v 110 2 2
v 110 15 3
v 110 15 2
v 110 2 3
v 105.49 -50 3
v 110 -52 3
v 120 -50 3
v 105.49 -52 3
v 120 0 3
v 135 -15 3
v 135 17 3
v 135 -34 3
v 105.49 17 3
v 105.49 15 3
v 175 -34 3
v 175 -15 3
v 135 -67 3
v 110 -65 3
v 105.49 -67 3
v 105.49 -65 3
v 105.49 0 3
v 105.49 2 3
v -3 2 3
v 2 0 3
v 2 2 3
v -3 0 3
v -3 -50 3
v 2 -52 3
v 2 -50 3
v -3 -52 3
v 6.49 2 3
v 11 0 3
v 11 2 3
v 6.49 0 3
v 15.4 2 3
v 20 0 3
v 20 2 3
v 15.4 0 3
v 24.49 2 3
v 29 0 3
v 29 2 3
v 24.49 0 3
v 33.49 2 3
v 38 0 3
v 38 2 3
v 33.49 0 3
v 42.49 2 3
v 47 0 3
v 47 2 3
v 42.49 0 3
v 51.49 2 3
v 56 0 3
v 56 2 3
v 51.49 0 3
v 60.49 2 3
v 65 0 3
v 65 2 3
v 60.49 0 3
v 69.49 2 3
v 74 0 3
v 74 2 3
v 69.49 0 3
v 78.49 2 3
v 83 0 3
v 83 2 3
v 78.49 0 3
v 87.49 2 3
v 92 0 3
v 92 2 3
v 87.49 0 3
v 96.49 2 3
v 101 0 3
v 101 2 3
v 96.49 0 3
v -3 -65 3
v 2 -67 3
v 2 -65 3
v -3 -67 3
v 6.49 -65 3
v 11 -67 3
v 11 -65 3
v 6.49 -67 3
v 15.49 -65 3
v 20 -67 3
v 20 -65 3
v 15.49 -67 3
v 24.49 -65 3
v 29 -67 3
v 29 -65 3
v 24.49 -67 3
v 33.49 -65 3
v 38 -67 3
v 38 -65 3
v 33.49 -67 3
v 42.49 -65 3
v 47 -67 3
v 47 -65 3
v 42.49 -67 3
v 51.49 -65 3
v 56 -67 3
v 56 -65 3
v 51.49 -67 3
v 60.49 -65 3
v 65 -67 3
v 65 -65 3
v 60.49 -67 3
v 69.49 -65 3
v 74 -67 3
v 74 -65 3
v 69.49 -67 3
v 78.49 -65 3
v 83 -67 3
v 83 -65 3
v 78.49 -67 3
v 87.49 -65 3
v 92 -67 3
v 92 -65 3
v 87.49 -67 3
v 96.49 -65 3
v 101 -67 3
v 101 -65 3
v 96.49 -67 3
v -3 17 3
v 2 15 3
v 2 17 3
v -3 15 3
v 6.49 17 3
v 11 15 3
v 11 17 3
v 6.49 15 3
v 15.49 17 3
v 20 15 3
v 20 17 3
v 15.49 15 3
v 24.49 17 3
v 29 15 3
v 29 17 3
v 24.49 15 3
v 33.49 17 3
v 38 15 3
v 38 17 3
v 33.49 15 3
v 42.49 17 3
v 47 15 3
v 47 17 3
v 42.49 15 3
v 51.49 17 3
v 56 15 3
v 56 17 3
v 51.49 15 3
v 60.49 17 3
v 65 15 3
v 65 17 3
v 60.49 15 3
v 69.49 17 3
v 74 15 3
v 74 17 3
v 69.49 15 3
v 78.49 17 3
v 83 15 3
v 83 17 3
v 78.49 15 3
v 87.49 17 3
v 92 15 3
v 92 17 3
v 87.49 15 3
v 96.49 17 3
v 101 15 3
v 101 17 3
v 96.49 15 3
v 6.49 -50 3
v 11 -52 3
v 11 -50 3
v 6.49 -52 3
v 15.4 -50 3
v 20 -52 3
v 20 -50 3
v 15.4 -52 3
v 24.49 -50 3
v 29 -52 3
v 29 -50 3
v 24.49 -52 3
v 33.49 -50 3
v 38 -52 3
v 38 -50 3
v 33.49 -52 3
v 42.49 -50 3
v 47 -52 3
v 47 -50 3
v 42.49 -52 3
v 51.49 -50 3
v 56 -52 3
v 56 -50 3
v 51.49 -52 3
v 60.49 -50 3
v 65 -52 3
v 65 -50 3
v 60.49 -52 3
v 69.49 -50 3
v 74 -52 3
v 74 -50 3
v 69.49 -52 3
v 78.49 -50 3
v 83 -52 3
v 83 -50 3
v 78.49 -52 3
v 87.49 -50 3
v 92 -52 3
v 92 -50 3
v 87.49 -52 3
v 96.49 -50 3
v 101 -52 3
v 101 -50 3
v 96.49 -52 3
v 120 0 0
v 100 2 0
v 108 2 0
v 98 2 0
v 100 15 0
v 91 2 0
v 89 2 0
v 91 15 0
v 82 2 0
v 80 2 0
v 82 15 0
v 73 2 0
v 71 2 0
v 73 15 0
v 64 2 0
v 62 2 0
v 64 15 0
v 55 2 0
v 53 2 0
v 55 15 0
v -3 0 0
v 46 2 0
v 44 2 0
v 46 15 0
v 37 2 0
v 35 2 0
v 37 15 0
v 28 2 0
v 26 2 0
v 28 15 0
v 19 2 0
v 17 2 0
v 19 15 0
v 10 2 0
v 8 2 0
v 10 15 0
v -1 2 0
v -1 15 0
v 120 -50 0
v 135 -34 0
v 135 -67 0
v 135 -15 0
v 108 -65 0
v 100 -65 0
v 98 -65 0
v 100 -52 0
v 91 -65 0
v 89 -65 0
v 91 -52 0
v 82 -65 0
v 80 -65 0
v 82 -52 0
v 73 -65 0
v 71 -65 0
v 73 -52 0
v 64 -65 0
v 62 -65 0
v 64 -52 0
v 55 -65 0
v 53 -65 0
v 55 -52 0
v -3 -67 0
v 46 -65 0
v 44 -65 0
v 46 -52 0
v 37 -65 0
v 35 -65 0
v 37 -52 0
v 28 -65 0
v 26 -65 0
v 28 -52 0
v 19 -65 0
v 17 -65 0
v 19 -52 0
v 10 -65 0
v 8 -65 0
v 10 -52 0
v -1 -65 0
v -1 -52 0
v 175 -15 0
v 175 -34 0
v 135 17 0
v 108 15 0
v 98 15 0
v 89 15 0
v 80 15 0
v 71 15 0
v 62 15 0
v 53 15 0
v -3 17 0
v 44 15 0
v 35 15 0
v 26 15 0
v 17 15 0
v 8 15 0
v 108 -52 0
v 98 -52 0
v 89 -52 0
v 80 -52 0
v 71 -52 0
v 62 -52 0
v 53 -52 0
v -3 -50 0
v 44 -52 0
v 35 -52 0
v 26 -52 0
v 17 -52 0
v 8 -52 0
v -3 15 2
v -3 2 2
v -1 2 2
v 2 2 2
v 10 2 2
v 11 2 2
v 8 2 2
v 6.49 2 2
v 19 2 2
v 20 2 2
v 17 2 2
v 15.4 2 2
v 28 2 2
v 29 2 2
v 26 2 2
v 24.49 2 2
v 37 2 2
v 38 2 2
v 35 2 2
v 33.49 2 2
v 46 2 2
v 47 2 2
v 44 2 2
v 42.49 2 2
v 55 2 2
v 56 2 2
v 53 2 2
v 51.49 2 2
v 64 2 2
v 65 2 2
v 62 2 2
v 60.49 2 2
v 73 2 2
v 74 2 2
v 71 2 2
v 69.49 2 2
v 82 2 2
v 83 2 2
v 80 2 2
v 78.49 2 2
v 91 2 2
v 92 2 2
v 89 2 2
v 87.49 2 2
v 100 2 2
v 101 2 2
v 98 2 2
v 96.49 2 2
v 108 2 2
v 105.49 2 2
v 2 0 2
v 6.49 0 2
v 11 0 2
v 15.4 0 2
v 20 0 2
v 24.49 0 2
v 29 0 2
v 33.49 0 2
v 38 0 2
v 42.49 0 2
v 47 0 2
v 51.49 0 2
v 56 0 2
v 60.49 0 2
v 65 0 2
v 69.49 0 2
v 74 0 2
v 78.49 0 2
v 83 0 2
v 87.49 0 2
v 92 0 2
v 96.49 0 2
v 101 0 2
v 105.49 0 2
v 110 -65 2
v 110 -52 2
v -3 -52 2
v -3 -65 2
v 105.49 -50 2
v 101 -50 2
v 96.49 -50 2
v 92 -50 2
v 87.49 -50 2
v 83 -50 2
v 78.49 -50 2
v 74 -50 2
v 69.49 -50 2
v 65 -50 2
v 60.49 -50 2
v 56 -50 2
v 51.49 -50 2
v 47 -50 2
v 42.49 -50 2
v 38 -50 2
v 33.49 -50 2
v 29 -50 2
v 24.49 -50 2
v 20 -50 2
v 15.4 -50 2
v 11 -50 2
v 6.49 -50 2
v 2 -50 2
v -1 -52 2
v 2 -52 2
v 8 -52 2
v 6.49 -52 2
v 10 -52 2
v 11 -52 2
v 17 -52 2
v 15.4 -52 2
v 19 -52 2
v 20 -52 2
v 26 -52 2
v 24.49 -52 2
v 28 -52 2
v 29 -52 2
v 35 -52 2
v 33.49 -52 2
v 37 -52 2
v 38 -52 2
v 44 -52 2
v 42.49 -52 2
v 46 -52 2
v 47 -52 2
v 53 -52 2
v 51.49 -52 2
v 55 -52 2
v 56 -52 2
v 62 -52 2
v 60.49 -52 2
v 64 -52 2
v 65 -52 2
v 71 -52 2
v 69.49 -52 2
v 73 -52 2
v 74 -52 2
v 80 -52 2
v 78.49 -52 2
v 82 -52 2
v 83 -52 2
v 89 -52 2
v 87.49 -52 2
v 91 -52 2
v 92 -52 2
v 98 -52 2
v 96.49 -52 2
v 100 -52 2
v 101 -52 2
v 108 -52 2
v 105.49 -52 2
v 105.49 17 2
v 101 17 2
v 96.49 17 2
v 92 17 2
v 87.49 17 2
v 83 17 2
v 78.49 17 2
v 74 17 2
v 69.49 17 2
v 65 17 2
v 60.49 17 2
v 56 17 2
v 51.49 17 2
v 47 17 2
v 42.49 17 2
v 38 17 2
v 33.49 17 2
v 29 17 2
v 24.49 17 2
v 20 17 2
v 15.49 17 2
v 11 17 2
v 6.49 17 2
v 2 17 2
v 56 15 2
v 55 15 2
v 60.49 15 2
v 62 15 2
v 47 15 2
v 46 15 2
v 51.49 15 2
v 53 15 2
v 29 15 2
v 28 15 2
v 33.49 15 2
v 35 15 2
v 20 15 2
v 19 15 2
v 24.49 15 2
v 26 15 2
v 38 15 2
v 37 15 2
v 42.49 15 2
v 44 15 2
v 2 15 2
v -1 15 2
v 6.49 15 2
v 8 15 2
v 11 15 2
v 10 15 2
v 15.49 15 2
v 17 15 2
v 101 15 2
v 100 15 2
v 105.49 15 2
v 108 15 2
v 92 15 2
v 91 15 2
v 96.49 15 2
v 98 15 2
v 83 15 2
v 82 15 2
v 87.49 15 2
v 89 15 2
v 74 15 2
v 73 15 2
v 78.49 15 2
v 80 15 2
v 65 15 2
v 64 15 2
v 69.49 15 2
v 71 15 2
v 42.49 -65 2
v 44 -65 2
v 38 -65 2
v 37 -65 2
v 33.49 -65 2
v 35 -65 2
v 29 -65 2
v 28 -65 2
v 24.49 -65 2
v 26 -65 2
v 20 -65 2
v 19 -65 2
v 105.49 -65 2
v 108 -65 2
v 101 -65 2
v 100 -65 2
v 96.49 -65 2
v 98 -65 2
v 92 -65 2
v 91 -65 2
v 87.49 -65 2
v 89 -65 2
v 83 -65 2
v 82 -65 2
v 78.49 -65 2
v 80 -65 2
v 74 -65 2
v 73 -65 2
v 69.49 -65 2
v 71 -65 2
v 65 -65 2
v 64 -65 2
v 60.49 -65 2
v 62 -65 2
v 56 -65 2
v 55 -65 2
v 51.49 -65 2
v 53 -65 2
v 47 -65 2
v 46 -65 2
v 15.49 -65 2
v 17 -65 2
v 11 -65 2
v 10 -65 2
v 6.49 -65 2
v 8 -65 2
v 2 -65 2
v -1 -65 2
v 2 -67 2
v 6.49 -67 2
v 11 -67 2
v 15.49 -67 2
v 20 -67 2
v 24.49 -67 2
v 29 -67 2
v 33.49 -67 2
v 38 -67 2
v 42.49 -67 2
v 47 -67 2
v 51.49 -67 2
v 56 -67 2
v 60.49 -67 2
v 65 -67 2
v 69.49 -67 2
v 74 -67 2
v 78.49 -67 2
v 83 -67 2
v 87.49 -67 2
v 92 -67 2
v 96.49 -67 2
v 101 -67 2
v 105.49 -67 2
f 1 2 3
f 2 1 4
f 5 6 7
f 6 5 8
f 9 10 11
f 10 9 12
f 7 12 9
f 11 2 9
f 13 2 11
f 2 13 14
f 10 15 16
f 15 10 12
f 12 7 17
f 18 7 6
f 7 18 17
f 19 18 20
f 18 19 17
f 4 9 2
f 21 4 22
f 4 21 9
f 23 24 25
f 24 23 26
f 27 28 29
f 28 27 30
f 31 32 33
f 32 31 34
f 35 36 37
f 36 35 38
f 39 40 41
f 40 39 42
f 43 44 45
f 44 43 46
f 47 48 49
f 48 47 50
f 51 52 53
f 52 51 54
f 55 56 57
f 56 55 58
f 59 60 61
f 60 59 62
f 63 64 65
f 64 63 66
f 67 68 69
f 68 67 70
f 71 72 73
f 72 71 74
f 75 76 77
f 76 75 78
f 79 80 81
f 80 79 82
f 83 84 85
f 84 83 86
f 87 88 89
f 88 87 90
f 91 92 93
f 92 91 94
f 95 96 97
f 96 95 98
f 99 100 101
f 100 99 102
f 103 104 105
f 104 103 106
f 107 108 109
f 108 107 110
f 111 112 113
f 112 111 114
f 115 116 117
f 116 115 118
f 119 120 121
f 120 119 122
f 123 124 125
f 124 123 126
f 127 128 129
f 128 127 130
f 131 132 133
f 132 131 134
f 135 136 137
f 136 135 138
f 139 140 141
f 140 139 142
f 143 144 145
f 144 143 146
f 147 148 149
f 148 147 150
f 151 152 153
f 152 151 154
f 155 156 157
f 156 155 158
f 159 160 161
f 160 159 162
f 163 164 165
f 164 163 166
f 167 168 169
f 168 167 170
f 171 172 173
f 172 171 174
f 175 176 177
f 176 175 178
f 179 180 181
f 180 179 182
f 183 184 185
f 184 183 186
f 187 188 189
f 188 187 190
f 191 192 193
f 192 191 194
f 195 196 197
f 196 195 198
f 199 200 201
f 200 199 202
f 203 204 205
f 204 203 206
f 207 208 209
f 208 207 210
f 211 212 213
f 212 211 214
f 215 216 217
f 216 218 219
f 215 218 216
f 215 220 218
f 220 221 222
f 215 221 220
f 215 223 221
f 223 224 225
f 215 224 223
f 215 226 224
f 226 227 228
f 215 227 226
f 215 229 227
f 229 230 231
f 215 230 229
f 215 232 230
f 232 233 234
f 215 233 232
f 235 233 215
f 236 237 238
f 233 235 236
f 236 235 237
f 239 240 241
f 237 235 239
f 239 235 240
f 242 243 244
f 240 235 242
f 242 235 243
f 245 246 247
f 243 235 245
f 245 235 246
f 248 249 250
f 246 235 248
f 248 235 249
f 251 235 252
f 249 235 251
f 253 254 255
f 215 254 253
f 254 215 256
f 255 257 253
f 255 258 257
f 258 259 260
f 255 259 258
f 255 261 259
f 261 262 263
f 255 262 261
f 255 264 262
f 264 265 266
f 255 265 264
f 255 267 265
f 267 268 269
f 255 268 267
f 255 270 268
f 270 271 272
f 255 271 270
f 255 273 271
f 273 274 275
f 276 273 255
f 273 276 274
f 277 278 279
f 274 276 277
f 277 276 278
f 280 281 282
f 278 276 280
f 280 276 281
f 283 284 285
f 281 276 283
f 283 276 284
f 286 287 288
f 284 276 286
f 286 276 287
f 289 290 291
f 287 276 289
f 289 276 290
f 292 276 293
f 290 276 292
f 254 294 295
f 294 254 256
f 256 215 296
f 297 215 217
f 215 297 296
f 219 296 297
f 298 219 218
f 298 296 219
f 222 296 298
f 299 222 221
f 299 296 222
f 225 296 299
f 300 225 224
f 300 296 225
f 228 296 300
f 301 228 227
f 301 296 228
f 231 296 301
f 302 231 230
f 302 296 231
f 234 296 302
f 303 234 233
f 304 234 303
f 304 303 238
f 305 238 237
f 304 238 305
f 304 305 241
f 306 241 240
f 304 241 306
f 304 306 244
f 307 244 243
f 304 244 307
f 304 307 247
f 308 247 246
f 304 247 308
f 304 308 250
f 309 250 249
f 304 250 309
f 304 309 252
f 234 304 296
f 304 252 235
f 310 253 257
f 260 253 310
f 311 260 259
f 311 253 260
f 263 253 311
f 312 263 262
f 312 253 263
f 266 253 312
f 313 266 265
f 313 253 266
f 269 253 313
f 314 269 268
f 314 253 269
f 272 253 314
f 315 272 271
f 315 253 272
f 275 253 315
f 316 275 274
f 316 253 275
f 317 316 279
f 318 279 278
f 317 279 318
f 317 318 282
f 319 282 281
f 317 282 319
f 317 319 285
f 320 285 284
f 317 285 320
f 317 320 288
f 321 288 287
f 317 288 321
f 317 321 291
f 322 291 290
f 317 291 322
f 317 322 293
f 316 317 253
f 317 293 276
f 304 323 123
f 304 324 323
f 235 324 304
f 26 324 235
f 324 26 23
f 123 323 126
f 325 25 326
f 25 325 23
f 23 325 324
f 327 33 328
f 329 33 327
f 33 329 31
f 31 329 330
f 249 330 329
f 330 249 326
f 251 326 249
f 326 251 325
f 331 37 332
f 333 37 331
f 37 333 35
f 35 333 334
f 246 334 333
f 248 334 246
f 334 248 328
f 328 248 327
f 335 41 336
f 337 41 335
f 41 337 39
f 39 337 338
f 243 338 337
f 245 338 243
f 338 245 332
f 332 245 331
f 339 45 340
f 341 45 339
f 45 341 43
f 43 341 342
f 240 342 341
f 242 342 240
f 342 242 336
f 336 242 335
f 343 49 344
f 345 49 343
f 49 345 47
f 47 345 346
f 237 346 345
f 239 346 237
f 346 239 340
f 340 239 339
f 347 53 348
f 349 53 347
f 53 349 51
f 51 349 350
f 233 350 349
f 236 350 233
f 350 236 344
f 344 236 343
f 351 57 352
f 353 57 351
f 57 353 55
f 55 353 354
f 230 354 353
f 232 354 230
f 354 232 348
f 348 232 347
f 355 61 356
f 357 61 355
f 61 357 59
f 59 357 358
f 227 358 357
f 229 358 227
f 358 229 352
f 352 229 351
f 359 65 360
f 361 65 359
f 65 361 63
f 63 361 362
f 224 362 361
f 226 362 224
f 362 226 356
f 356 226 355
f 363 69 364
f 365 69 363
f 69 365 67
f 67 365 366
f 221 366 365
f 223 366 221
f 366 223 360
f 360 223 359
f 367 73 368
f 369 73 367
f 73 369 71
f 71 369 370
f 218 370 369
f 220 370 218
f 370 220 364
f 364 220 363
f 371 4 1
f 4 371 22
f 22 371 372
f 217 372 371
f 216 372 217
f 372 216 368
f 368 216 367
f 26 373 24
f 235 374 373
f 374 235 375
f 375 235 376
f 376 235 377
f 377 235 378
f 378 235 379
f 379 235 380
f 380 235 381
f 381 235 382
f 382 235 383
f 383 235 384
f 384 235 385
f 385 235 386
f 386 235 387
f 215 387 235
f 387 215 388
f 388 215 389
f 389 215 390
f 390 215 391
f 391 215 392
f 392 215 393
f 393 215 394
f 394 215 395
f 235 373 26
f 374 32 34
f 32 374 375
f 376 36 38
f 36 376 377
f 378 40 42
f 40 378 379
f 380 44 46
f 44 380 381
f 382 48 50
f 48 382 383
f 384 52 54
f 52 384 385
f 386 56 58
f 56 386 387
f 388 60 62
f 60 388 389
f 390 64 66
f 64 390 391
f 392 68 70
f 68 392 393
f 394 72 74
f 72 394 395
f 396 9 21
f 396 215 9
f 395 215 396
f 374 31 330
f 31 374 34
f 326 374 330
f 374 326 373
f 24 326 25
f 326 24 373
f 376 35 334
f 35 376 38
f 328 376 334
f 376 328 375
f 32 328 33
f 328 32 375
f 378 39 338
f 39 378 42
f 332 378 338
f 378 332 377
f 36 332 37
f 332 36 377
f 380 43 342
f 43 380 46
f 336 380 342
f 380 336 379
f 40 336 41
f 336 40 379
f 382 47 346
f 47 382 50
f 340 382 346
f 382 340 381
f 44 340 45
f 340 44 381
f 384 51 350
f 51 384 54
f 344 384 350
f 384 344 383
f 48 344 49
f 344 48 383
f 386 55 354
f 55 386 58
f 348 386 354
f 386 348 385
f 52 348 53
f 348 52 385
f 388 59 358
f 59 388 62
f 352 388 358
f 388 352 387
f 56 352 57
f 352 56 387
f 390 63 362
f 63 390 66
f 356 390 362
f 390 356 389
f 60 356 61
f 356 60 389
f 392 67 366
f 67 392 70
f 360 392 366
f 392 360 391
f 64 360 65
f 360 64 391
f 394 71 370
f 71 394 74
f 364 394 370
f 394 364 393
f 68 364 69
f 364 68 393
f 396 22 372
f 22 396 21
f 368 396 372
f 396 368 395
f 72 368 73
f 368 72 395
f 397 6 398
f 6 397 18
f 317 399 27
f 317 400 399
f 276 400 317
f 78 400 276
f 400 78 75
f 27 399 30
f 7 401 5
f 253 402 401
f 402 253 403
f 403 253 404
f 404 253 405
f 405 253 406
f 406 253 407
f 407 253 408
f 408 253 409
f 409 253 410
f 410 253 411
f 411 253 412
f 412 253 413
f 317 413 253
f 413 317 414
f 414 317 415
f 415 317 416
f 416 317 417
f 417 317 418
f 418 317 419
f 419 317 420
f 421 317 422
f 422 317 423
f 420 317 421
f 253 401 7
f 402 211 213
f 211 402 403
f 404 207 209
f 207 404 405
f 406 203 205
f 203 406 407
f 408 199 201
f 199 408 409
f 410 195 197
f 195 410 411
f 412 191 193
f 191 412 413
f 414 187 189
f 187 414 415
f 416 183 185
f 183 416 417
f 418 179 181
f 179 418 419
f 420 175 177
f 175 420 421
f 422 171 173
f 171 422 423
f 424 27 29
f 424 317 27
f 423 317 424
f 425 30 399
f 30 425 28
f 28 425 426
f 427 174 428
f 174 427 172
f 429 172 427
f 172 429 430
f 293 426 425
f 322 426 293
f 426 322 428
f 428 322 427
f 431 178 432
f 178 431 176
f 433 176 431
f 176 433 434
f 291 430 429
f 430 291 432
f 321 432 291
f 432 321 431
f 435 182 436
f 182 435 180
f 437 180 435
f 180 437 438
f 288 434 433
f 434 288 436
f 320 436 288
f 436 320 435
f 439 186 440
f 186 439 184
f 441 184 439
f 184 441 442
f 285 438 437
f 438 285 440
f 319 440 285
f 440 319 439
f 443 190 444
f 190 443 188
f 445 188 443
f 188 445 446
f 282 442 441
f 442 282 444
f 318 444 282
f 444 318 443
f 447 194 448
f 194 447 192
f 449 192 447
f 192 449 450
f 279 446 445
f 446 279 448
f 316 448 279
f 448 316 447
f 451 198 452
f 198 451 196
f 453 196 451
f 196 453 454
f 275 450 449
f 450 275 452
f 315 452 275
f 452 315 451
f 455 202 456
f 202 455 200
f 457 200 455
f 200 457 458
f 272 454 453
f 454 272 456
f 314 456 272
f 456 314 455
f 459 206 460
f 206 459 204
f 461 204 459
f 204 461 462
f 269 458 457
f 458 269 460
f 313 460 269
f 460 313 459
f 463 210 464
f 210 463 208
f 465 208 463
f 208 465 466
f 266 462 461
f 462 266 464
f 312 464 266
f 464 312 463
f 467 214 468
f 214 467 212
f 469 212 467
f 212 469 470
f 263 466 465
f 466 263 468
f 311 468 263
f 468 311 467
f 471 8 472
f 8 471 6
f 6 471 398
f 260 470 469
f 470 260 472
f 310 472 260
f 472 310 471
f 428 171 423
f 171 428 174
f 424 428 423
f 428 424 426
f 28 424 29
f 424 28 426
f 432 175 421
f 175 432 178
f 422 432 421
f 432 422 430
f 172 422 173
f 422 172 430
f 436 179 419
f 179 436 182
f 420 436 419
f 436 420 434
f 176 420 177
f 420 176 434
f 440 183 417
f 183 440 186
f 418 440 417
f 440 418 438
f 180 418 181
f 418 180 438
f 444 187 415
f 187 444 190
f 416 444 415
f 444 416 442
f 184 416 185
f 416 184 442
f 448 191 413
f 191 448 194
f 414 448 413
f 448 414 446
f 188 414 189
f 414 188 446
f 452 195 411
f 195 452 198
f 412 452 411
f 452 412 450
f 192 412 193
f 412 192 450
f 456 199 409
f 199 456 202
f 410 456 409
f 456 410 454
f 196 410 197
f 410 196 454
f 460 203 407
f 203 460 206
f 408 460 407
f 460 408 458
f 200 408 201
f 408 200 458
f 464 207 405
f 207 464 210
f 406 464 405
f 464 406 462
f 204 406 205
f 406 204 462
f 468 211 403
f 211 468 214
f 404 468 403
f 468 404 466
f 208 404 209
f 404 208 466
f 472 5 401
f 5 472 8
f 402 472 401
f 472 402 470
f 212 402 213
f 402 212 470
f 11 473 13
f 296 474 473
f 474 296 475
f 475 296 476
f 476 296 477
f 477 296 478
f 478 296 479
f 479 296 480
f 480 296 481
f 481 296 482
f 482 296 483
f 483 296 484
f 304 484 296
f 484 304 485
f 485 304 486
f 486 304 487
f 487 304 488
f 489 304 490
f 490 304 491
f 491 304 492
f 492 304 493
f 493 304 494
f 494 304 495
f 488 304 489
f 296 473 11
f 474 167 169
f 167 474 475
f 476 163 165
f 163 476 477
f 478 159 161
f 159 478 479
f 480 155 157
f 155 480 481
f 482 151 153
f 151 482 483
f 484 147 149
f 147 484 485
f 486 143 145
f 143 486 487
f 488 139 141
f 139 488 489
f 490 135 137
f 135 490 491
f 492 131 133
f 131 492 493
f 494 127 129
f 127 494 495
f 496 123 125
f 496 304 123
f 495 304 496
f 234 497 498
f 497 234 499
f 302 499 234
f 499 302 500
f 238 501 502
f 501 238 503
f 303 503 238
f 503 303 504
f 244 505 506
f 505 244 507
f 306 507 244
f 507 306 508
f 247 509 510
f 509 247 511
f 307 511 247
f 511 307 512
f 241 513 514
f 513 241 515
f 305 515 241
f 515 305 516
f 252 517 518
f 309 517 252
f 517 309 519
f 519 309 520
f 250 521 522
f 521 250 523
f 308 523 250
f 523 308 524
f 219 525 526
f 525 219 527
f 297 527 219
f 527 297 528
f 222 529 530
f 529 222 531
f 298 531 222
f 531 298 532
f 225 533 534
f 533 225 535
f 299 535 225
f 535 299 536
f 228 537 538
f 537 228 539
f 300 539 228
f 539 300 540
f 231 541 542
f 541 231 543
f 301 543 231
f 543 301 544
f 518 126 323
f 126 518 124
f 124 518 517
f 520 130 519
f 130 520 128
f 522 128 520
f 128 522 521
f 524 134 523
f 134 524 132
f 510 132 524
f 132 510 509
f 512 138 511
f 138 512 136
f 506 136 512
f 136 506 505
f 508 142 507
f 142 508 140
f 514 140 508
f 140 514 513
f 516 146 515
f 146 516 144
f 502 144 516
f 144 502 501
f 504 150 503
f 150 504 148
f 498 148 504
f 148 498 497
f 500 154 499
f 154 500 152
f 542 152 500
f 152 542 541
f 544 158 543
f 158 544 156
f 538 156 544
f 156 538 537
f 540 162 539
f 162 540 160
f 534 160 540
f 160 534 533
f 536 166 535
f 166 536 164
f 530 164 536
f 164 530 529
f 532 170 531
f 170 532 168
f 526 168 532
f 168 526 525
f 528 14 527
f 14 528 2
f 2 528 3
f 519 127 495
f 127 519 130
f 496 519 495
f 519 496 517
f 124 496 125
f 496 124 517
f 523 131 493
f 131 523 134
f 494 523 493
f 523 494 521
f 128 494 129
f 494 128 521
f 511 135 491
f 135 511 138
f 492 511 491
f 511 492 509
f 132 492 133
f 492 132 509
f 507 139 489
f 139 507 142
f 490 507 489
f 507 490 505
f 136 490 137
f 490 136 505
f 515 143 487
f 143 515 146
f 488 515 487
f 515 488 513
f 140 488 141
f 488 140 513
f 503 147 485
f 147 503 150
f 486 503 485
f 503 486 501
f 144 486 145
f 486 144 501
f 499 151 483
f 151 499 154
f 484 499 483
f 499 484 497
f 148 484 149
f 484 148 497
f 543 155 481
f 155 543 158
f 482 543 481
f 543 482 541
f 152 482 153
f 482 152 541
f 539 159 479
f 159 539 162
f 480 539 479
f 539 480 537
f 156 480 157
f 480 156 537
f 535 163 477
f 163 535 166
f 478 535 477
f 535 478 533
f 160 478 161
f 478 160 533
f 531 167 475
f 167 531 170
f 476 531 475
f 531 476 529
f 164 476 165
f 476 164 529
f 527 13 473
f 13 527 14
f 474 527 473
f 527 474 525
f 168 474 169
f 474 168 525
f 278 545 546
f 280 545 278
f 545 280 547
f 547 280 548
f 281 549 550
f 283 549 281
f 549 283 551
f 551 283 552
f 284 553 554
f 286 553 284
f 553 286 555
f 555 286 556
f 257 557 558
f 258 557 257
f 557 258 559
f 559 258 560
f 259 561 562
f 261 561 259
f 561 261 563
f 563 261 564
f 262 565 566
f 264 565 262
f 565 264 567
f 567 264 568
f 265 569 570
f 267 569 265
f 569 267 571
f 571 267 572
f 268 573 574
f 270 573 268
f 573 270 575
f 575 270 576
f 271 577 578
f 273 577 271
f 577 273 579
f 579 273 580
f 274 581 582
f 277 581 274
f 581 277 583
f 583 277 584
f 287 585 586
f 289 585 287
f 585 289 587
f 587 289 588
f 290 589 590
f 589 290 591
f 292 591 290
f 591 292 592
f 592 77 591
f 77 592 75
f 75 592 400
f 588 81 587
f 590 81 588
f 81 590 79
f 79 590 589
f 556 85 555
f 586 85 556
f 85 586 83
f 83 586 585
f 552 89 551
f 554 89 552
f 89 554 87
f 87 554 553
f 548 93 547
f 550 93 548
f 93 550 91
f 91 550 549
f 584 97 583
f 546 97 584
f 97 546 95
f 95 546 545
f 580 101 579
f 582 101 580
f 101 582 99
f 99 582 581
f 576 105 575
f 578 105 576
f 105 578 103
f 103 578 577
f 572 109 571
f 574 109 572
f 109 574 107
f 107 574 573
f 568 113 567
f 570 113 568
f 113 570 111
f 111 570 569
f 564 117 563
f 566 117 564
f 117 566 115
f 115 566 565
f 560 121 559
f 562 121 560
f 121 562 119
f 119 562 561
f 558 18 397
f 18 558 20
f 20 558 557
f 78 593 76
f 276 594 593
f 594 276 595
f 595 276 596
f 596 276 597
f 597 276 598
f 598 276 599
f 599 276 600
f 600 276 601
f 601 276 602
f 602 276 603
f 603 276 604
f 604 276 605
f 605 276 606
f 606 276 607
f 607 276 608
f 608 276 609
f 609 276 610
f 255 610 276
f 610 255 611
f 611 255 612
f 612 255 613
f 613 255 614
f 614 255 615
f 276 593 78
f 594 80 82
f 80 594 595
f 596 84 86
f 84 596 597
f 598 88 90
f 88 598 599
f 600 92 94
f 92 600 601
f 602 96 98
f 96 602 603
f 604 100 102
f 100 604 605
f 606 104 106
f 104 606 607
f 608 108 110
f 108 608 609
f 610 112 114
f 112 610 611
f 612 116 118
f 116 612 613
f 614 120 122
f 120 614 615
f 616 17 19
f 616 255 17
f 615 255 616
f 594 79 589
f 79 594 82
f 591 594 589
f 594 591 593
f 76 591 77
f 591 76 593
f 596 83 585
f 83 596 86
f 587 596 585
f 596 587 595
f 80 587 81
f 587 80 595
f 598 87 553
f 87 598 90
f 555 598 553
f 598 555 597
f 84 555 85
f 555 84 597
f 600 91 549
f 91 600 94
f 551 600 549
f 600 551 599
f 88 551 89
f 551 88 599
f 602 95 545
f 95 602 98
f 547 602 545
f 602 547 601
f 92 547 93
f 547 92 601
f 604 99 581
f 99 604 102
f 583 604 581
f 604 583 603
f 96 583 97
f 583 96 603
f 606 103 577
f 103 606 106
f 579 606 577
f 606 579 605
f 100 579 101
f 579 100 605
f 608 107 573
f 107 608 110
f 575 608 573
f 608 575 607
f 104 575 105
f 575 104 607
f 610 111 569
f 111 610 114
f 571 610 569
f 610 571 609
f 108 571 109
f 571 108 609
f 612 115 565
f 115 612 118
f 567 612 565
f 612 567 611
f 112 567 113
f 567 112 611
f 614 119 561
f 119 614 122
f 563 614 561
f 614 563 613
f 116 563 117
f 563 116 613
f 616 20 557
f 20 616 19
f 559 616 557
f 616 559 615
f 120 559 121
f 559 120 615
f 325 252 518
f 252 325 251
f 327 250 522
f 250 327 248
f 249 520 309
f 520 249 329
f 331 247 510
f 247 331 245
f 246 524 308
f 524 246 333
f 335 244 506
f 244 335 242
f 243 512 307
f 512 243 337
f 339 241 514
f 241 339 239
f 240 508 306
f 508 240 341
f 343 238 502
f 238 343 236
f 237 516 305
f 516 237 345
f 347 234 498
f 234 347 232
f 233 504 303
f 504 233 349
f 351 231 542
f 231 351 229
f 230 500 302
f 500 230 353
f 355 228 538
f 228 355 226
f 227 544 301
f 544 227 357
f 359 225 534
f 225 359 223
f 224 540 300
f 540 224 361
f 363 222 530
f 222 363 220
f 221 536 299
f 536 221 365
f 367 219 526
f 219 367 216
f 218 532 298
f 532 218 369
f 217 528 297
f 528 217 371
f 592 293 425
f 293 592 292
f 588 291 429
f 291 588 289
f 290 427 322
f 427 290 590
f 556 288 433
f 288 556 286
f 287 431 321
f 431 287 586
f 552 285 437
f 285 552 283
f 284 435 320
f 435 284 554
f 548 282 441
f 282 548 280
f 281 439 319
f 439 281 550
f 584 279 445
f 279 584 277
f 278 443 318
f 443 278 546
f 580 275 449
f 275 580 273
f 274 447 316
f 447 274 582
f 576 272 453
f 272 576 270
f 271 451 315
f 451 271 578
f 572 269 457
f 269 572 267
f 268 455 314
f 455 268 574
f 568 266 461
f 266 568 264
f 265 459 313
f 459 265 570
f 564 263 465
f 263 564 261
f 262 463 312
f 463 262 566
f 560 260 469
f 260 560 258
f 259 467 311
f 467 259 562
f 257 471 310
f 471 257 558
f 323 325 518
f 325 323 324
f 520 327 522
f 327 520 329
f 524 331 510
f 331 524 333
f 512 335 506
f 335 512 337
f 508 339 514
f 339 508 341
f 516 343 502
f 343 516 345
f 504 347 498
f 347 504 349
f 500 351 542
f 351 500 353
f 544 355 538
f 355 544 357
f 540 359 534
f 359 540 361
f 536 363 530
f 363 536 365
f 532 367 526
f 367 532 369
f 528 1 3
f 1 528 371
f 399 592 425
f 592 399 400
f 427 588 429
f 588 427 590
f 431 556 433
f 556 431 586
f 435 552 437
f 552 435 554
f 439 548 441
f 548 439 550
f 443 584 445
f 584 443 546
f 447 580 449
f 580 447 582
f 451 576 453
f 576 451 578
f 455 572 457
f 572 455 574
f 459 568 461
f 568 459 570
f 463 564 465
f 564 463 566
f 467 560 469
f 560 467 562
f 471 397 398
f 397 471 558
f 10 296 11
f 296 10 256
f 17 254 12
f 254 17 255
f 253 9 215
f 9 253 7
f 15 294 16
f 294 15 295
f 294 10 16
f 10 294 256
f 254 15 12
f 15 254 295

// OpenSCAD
difference (){
    
union () {
    
difference () {
translate ([-3,0,0])cube ([113, 2, 3]);


translate ([2,-75,2])cube ([4.49,95,3]);

translate ([11,-5,2])cube ([4.4,20,3]);
    translate ([20,-5,2])cube ([4.49,20,3]);
    translate ([29,-5,2])cube ([4.49,20,3]);
    translate ([38,-5,2])cube ([4.49,20,3]);
    translate ([47,-5,2])cube ([4.49,20,3]);
    translate ([56,-5,2])cube ([4.49,20,3]);
    translate ([65,-5,2])cube ([4.49,20,3]);
    translate ([74,-5,2])cube ([4.49,20,3]);
    translate ([83,-5,2])cube ([4.49,20,3]);
    translate ([92,-5,2])cube ([4.49,20,3]);
    translate ([101,-5,2])cube ([4.49,20,3]);
}

difference () {
translate ([-3,-52,0]) cube ([113, 2, 3]);

translate ([2,-75,2])cube ([4.49,95,3]);

translate ([11,-70,2])cube ([4.4,105,3]);
    translate ([20,-75,2])cube ([4.49,105,3]);
    translate ([29,-75,2])cube ([4.49,120,3]);
    translate ([38,-75,2])cube ([4.49,120,3]);
    translate ([47,-75,2])cube ([4.49,120,3]);
    translate ([56,-75,2])cube ([4.49,120,3]);
    translate ([65,-75,2])cube ([4.49,120,3]);
    translate ([74,-75,2])cube ([4.49,120,3]);
    translate ([83,-75,2])cube ([4.49,120,3]);
    translate ([92,-75,2])cube ([4.49,120,3]);
    translate ([101,-75,2])cube ([4.49,120,3]);
    
}

difference () {
translate ([-3,15,0])cube ([113, 2, 3]);


translate ([2,5,2])cube ([4.49,20,5]);

translate ([11,5,2])cube ([4.49,20,5]);
    translate ([20,5,2])cube ([4.49,20,3]);
    translate ([29,5,2])cube ([4.49,20,3]);
    translate ([38,5,2])cube ([4.49,20,3]);
    translate ([47,5,2])cube ([4.49,20,3]);
    translate ([56,5,2])cube ([4.49,20,3]);
    translate ([65,5,2])cube ([4.49,20,3]);
    translate ([74,5,2])cube ([4.49,20,3]);
    translate ([83,5,2])cube ([4.49,20,3]);
    translate ([92,5,2])cube ([4.49,20,3]);
    translate ([101,5,2])cube ([4.49,20,3]);

}
difference () {
translate ([-3,-67,0])cube ([113, 2, 3]);

translate ([2,-80,2])cube ([4.49,20,5]);

translate ([11,-80,2])cube ([4.49,20,5]);
translate ([20,-80,2])cube ([4.49,20,3]);
    translate ([29,-80,2])cube ([4.49,20,3]);
    translate ([38,-80,2])cube ([4.49,20,3]);
    translate ([47,-80,2])cube ([4.49,20,3]);
    translate ([56,-80,2])cube ([4.49,20,3]);
    translate ([65,-80,2])cube ([4.49,20,3]);
    translate ([74,-80,2])cube ([4.49,20,3]);
    translate ([83,-80,2])cube ([4.49,20,3]);
    translate ([92,-80,2])cube ([4.49,20,3]);
    translate ([101,-80,2])cube ([4.49,20,3]);
}

    translate ([-3,0,0]) cube ([2,15,3]);
 translate ([8,0,0]) cube ([2,15,3]);
 translate ([17,0,0]) cube ([2,15,3]);
   translate ([26,0,0]) cube ([2,15,3]);
 translate ([35,0,0]) cube ([2,15,3]);
 translate ([44,0,0]) cube ([2,15,3]);
translate ([53,0,0]) cube ([2,15,3]);
 translate ([62,0,0]) cube ([2,15,3]);
 translate ([71,0,0]) cube ([2,15,3]);
   translate ([80,0,0]) cube ([2,15,3]);
 translate ([89,0,0]) cube ([2,15,3]);
 translate ([98,0,0]) cube ([2,15,3]);
translate ([108,0,0]) cube ([2,15,3]);

    translate ([-3,-65,0]) cube ([2,15,3]);
 translate ([8,-65,0]) cube ([2,15,3]);
 translate ([17,-65,0]) cube ([2,15,3]);
   translate ([26,-65,0]) cube ([2,15,3]);
 translate ([35,-65,0]) cube ([2,15,3]);
 translate ([44,-65,0]) cube ([2,15,3]);
translate ([53,-65,0]) cube ([2,15,3]);
 translate ([62,-65,0]) cube ([2,15,3]);
 translate ([71,-65,0]) cube ([2,15,3]);
   translate ([80,-65,0]) cube ([2,15,3]);
 translate ([89,-65,0]) cube ([2,15,3]);
 translate ([98,-65,0]) cube ([2,15,3]);
translate ([108,-65,0]) cube ([2,15,3]);
}

translate ([-5,2,2]) cube ([120,13,3]);
translate ([-5,-65,2]) cube ([120,13,3]);
}

translate ([110,0,0])cube ([25, 17, 3]);
translate ([110,-67,0])cube ([25, 17, 3]);

translate ([120,-34,0])cube ([15, 17, 3]);
translate ([120,-17,0])cube ([15, 17, 3]);
translate ([120,-51,0])cube ([15, 17, 3]);

translate ([135,-34,0])cube ([40, 19, 3]);
